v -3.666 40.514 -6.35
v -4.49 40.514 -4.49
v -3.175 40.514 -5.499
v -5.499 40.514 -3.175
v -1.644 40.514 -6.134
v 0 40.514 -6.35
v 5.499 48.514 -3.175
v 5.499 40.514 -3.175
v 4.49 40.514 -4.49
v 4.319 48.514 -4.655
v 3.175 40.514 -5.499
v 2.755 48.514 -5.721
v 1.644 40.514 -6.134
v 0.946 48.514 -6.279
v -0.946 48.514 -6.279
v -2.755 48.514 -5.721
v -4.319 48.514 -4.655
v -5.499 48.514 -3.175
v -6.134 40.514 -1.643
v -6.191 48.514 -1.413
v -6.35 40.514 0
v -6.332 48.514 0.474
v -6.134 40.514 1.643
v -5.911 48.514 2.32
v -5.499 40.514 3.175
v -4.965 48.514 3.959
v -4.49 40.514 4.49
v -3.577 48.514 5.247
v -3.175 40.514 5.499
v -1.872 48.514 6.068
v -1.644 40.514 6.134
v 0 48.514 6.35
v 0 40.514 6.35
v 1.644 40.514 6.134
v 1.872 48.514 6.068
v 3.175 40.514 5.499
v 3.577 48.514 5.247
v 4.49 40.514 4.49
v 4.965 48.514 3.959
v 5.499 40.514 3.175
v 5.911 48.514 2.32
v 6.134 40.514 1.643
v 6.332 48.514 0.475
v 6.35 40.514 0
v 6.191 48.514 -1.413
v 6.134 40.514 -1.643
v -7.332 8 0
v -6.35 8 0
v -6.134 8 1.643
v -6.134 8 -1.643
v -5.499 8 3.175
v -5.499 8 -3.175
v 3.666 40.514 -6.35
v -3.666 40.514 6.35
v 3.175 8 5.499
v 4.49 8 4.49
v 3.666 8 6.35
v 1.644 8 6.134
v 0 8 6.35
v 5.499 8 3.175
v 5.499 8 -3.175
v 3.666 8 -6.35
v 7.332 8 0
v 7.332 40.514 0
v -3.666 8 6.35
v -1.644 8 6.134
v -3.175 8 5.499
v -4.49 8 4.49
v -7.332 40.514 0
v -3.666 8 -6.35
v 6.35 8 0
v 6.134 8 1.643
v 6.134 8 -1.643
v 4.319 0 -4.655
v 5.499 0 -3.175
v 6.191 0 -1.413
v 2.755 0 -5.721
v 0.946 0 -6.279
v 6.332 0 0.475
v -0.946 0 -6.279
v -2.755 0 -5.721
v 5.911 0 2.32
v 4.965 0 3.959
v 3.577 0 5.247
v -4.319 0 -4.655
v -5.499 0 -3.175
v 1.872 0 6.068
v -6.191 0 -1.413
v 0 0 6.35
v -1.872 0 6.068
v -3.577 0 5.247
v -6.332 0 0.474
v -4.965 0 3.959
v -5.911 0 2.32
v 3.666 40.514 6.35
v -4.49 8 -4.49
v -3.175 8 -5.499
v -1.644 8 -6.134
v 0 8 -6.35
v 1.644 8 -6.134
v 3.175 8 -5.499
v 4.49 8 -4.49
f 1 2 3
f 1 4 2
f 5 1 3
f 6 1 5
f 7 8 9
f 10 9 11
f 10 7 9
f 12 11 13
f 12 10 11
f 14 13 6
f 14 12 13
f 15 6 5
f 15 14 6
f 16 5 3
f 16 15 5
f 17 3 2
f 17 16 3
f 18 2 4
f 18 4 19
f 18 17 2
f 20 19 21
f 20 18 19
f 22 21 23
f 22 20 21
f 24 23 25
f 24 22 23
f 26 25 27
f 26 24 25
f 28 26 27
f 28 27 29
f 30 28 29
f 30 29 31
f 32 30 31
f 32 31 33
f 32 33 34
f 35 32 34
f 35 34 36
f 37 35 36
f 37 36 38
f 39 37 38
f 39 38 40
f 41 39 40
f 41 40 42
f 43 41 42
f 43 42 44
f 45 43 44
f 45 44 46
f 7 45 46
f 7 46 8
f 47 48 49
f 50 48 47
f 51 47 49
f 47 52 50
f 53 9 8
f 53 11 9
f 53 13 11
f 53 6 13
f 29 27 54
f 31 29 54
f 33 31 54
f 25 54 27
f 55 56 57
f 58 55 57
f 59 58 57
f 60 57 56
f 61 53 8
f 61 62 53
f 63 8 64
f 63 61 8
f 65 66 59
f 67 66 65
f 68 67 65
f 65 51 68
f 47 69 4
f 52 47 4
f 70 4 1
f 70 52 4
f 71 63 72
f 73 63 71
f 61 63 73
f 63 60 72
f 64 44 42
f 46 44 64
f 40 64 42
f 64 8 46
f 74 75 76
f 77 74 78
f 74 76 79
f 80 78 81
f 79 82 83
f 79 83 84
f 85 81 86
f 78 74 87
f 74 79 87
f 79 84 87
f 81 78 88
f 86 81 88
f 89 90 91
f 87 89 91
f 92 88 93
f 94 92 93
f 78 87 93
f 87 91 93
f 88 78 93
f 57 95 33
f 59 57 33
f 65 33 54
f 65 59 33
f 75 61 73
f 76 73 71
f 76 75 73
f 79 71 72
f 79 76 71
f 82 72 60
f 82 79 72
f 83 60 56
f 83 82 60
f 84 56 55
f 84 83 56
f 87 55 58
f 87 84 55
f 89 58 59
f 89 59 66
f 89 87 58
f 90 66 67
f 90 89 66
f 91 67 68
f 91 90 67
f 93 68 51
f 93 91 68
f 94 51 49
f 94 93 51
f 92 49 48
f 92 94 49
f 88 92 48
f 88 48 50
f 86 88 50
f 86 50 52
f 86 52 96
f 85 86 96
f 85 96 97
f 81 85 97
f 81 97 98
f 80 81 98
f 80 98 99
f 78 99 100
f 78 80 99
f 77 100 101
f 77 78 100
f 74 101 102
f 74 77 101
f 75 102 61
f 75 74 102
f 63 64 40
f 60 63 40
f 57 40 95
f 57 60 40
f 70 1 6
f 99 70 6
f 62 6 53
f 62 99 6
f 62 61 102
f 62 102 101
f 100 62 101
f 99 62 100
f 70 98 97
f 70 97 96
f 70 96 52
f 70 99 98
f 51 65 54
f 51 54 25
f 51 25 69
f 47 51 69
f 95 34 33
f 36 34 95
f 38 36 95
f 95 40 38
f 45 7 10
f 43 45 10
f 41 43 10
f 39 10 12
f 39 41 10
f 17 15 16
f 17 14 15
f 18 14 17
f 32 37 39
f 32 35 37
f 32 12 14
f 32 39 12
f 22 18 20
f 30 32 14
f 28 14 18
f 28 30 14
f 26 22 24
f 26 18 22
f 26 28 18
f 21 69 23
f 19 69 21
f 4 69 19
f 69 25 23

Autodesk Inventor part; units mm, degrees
ref_plane "YZ Plane" through (0, 0, 0) normal (1, 0, 0) x (0, 1, 0)
ref_plane "XZ Plane" through (0, 0, 0) normal (0, 1, 0) x (-1, 0, 0)
sketch "Sketch1" plane through (0, 0, 0) normal (0, 1, 0) x (-1, 0, 0)
  line L0 (7.3323, 0) -> (3.6662, -6.35)
  line L1 (3.6662, -6.35) -> (-3.6662, -6.35)
  line L2 (-3.6662, -6.35) -> (-7.3323, 0)
  line L3 (-7.3323, 0) -> (-3.6662, 6.35)
  line L4 (-3.6662, 6.35) -> (3.6662, 6.35)
  line L5 (3.6662, 6.35) -> (7.3323, 0)
  line L6 (7.3323, 0) -> (0, 0)
  line L7 (0, 0) -> (0, -3.7196)
  dimension "d0" = 90
  dimension "d1" = 12.7
extrude "Extrusion1" add sketch "Sketch1" along normal blind 48.514
ref_plane "Work Plane2" through (0, 24.257, 0) normal (0, 1, 0) x (1, 0, 0)
sketch "Sketch3" plane through (0, 48.514, 0) normal (0, 1, 0) x (1, 0, 0)
  circle A0 centre (0, 0) radius 6.35
  line L0 (-3.6662, 6.35) -> (-7.3323, 0) projected
  line L1 (-3.6662, 6.35) -> (-7.3323, 0) projected
  line L2 (-7.3323, 0) -> (-3.6662, -6.35) projected
  line L3 (-3.6662, -6.35) -> (3.6662, -6.35) projected
  line L4 (3.6662, -6.35) -> (7.3323, 0) projected
  line L5 (7.3323, 0) -> (3.6662, 6.35) projected
  line L6 (3.6662, 6.35) -> (-3.6662, 6.35) projected
  dimension "d7" = 12.7
extrude "Extrusion3" cut sketch "Sketch3" against normal blind 8 contours A0 L5 L4 | A0 L6 L5 | L4 L3 A0 | A0 L0 L6 | L3 L2 A0 | A0 L2 L0
mirror "Mirror2" about plane through (0, 24.257, 0) normal (0, 1, 0) of "Extrusion3"
properties part number "Hex Shaft for E gear box"
